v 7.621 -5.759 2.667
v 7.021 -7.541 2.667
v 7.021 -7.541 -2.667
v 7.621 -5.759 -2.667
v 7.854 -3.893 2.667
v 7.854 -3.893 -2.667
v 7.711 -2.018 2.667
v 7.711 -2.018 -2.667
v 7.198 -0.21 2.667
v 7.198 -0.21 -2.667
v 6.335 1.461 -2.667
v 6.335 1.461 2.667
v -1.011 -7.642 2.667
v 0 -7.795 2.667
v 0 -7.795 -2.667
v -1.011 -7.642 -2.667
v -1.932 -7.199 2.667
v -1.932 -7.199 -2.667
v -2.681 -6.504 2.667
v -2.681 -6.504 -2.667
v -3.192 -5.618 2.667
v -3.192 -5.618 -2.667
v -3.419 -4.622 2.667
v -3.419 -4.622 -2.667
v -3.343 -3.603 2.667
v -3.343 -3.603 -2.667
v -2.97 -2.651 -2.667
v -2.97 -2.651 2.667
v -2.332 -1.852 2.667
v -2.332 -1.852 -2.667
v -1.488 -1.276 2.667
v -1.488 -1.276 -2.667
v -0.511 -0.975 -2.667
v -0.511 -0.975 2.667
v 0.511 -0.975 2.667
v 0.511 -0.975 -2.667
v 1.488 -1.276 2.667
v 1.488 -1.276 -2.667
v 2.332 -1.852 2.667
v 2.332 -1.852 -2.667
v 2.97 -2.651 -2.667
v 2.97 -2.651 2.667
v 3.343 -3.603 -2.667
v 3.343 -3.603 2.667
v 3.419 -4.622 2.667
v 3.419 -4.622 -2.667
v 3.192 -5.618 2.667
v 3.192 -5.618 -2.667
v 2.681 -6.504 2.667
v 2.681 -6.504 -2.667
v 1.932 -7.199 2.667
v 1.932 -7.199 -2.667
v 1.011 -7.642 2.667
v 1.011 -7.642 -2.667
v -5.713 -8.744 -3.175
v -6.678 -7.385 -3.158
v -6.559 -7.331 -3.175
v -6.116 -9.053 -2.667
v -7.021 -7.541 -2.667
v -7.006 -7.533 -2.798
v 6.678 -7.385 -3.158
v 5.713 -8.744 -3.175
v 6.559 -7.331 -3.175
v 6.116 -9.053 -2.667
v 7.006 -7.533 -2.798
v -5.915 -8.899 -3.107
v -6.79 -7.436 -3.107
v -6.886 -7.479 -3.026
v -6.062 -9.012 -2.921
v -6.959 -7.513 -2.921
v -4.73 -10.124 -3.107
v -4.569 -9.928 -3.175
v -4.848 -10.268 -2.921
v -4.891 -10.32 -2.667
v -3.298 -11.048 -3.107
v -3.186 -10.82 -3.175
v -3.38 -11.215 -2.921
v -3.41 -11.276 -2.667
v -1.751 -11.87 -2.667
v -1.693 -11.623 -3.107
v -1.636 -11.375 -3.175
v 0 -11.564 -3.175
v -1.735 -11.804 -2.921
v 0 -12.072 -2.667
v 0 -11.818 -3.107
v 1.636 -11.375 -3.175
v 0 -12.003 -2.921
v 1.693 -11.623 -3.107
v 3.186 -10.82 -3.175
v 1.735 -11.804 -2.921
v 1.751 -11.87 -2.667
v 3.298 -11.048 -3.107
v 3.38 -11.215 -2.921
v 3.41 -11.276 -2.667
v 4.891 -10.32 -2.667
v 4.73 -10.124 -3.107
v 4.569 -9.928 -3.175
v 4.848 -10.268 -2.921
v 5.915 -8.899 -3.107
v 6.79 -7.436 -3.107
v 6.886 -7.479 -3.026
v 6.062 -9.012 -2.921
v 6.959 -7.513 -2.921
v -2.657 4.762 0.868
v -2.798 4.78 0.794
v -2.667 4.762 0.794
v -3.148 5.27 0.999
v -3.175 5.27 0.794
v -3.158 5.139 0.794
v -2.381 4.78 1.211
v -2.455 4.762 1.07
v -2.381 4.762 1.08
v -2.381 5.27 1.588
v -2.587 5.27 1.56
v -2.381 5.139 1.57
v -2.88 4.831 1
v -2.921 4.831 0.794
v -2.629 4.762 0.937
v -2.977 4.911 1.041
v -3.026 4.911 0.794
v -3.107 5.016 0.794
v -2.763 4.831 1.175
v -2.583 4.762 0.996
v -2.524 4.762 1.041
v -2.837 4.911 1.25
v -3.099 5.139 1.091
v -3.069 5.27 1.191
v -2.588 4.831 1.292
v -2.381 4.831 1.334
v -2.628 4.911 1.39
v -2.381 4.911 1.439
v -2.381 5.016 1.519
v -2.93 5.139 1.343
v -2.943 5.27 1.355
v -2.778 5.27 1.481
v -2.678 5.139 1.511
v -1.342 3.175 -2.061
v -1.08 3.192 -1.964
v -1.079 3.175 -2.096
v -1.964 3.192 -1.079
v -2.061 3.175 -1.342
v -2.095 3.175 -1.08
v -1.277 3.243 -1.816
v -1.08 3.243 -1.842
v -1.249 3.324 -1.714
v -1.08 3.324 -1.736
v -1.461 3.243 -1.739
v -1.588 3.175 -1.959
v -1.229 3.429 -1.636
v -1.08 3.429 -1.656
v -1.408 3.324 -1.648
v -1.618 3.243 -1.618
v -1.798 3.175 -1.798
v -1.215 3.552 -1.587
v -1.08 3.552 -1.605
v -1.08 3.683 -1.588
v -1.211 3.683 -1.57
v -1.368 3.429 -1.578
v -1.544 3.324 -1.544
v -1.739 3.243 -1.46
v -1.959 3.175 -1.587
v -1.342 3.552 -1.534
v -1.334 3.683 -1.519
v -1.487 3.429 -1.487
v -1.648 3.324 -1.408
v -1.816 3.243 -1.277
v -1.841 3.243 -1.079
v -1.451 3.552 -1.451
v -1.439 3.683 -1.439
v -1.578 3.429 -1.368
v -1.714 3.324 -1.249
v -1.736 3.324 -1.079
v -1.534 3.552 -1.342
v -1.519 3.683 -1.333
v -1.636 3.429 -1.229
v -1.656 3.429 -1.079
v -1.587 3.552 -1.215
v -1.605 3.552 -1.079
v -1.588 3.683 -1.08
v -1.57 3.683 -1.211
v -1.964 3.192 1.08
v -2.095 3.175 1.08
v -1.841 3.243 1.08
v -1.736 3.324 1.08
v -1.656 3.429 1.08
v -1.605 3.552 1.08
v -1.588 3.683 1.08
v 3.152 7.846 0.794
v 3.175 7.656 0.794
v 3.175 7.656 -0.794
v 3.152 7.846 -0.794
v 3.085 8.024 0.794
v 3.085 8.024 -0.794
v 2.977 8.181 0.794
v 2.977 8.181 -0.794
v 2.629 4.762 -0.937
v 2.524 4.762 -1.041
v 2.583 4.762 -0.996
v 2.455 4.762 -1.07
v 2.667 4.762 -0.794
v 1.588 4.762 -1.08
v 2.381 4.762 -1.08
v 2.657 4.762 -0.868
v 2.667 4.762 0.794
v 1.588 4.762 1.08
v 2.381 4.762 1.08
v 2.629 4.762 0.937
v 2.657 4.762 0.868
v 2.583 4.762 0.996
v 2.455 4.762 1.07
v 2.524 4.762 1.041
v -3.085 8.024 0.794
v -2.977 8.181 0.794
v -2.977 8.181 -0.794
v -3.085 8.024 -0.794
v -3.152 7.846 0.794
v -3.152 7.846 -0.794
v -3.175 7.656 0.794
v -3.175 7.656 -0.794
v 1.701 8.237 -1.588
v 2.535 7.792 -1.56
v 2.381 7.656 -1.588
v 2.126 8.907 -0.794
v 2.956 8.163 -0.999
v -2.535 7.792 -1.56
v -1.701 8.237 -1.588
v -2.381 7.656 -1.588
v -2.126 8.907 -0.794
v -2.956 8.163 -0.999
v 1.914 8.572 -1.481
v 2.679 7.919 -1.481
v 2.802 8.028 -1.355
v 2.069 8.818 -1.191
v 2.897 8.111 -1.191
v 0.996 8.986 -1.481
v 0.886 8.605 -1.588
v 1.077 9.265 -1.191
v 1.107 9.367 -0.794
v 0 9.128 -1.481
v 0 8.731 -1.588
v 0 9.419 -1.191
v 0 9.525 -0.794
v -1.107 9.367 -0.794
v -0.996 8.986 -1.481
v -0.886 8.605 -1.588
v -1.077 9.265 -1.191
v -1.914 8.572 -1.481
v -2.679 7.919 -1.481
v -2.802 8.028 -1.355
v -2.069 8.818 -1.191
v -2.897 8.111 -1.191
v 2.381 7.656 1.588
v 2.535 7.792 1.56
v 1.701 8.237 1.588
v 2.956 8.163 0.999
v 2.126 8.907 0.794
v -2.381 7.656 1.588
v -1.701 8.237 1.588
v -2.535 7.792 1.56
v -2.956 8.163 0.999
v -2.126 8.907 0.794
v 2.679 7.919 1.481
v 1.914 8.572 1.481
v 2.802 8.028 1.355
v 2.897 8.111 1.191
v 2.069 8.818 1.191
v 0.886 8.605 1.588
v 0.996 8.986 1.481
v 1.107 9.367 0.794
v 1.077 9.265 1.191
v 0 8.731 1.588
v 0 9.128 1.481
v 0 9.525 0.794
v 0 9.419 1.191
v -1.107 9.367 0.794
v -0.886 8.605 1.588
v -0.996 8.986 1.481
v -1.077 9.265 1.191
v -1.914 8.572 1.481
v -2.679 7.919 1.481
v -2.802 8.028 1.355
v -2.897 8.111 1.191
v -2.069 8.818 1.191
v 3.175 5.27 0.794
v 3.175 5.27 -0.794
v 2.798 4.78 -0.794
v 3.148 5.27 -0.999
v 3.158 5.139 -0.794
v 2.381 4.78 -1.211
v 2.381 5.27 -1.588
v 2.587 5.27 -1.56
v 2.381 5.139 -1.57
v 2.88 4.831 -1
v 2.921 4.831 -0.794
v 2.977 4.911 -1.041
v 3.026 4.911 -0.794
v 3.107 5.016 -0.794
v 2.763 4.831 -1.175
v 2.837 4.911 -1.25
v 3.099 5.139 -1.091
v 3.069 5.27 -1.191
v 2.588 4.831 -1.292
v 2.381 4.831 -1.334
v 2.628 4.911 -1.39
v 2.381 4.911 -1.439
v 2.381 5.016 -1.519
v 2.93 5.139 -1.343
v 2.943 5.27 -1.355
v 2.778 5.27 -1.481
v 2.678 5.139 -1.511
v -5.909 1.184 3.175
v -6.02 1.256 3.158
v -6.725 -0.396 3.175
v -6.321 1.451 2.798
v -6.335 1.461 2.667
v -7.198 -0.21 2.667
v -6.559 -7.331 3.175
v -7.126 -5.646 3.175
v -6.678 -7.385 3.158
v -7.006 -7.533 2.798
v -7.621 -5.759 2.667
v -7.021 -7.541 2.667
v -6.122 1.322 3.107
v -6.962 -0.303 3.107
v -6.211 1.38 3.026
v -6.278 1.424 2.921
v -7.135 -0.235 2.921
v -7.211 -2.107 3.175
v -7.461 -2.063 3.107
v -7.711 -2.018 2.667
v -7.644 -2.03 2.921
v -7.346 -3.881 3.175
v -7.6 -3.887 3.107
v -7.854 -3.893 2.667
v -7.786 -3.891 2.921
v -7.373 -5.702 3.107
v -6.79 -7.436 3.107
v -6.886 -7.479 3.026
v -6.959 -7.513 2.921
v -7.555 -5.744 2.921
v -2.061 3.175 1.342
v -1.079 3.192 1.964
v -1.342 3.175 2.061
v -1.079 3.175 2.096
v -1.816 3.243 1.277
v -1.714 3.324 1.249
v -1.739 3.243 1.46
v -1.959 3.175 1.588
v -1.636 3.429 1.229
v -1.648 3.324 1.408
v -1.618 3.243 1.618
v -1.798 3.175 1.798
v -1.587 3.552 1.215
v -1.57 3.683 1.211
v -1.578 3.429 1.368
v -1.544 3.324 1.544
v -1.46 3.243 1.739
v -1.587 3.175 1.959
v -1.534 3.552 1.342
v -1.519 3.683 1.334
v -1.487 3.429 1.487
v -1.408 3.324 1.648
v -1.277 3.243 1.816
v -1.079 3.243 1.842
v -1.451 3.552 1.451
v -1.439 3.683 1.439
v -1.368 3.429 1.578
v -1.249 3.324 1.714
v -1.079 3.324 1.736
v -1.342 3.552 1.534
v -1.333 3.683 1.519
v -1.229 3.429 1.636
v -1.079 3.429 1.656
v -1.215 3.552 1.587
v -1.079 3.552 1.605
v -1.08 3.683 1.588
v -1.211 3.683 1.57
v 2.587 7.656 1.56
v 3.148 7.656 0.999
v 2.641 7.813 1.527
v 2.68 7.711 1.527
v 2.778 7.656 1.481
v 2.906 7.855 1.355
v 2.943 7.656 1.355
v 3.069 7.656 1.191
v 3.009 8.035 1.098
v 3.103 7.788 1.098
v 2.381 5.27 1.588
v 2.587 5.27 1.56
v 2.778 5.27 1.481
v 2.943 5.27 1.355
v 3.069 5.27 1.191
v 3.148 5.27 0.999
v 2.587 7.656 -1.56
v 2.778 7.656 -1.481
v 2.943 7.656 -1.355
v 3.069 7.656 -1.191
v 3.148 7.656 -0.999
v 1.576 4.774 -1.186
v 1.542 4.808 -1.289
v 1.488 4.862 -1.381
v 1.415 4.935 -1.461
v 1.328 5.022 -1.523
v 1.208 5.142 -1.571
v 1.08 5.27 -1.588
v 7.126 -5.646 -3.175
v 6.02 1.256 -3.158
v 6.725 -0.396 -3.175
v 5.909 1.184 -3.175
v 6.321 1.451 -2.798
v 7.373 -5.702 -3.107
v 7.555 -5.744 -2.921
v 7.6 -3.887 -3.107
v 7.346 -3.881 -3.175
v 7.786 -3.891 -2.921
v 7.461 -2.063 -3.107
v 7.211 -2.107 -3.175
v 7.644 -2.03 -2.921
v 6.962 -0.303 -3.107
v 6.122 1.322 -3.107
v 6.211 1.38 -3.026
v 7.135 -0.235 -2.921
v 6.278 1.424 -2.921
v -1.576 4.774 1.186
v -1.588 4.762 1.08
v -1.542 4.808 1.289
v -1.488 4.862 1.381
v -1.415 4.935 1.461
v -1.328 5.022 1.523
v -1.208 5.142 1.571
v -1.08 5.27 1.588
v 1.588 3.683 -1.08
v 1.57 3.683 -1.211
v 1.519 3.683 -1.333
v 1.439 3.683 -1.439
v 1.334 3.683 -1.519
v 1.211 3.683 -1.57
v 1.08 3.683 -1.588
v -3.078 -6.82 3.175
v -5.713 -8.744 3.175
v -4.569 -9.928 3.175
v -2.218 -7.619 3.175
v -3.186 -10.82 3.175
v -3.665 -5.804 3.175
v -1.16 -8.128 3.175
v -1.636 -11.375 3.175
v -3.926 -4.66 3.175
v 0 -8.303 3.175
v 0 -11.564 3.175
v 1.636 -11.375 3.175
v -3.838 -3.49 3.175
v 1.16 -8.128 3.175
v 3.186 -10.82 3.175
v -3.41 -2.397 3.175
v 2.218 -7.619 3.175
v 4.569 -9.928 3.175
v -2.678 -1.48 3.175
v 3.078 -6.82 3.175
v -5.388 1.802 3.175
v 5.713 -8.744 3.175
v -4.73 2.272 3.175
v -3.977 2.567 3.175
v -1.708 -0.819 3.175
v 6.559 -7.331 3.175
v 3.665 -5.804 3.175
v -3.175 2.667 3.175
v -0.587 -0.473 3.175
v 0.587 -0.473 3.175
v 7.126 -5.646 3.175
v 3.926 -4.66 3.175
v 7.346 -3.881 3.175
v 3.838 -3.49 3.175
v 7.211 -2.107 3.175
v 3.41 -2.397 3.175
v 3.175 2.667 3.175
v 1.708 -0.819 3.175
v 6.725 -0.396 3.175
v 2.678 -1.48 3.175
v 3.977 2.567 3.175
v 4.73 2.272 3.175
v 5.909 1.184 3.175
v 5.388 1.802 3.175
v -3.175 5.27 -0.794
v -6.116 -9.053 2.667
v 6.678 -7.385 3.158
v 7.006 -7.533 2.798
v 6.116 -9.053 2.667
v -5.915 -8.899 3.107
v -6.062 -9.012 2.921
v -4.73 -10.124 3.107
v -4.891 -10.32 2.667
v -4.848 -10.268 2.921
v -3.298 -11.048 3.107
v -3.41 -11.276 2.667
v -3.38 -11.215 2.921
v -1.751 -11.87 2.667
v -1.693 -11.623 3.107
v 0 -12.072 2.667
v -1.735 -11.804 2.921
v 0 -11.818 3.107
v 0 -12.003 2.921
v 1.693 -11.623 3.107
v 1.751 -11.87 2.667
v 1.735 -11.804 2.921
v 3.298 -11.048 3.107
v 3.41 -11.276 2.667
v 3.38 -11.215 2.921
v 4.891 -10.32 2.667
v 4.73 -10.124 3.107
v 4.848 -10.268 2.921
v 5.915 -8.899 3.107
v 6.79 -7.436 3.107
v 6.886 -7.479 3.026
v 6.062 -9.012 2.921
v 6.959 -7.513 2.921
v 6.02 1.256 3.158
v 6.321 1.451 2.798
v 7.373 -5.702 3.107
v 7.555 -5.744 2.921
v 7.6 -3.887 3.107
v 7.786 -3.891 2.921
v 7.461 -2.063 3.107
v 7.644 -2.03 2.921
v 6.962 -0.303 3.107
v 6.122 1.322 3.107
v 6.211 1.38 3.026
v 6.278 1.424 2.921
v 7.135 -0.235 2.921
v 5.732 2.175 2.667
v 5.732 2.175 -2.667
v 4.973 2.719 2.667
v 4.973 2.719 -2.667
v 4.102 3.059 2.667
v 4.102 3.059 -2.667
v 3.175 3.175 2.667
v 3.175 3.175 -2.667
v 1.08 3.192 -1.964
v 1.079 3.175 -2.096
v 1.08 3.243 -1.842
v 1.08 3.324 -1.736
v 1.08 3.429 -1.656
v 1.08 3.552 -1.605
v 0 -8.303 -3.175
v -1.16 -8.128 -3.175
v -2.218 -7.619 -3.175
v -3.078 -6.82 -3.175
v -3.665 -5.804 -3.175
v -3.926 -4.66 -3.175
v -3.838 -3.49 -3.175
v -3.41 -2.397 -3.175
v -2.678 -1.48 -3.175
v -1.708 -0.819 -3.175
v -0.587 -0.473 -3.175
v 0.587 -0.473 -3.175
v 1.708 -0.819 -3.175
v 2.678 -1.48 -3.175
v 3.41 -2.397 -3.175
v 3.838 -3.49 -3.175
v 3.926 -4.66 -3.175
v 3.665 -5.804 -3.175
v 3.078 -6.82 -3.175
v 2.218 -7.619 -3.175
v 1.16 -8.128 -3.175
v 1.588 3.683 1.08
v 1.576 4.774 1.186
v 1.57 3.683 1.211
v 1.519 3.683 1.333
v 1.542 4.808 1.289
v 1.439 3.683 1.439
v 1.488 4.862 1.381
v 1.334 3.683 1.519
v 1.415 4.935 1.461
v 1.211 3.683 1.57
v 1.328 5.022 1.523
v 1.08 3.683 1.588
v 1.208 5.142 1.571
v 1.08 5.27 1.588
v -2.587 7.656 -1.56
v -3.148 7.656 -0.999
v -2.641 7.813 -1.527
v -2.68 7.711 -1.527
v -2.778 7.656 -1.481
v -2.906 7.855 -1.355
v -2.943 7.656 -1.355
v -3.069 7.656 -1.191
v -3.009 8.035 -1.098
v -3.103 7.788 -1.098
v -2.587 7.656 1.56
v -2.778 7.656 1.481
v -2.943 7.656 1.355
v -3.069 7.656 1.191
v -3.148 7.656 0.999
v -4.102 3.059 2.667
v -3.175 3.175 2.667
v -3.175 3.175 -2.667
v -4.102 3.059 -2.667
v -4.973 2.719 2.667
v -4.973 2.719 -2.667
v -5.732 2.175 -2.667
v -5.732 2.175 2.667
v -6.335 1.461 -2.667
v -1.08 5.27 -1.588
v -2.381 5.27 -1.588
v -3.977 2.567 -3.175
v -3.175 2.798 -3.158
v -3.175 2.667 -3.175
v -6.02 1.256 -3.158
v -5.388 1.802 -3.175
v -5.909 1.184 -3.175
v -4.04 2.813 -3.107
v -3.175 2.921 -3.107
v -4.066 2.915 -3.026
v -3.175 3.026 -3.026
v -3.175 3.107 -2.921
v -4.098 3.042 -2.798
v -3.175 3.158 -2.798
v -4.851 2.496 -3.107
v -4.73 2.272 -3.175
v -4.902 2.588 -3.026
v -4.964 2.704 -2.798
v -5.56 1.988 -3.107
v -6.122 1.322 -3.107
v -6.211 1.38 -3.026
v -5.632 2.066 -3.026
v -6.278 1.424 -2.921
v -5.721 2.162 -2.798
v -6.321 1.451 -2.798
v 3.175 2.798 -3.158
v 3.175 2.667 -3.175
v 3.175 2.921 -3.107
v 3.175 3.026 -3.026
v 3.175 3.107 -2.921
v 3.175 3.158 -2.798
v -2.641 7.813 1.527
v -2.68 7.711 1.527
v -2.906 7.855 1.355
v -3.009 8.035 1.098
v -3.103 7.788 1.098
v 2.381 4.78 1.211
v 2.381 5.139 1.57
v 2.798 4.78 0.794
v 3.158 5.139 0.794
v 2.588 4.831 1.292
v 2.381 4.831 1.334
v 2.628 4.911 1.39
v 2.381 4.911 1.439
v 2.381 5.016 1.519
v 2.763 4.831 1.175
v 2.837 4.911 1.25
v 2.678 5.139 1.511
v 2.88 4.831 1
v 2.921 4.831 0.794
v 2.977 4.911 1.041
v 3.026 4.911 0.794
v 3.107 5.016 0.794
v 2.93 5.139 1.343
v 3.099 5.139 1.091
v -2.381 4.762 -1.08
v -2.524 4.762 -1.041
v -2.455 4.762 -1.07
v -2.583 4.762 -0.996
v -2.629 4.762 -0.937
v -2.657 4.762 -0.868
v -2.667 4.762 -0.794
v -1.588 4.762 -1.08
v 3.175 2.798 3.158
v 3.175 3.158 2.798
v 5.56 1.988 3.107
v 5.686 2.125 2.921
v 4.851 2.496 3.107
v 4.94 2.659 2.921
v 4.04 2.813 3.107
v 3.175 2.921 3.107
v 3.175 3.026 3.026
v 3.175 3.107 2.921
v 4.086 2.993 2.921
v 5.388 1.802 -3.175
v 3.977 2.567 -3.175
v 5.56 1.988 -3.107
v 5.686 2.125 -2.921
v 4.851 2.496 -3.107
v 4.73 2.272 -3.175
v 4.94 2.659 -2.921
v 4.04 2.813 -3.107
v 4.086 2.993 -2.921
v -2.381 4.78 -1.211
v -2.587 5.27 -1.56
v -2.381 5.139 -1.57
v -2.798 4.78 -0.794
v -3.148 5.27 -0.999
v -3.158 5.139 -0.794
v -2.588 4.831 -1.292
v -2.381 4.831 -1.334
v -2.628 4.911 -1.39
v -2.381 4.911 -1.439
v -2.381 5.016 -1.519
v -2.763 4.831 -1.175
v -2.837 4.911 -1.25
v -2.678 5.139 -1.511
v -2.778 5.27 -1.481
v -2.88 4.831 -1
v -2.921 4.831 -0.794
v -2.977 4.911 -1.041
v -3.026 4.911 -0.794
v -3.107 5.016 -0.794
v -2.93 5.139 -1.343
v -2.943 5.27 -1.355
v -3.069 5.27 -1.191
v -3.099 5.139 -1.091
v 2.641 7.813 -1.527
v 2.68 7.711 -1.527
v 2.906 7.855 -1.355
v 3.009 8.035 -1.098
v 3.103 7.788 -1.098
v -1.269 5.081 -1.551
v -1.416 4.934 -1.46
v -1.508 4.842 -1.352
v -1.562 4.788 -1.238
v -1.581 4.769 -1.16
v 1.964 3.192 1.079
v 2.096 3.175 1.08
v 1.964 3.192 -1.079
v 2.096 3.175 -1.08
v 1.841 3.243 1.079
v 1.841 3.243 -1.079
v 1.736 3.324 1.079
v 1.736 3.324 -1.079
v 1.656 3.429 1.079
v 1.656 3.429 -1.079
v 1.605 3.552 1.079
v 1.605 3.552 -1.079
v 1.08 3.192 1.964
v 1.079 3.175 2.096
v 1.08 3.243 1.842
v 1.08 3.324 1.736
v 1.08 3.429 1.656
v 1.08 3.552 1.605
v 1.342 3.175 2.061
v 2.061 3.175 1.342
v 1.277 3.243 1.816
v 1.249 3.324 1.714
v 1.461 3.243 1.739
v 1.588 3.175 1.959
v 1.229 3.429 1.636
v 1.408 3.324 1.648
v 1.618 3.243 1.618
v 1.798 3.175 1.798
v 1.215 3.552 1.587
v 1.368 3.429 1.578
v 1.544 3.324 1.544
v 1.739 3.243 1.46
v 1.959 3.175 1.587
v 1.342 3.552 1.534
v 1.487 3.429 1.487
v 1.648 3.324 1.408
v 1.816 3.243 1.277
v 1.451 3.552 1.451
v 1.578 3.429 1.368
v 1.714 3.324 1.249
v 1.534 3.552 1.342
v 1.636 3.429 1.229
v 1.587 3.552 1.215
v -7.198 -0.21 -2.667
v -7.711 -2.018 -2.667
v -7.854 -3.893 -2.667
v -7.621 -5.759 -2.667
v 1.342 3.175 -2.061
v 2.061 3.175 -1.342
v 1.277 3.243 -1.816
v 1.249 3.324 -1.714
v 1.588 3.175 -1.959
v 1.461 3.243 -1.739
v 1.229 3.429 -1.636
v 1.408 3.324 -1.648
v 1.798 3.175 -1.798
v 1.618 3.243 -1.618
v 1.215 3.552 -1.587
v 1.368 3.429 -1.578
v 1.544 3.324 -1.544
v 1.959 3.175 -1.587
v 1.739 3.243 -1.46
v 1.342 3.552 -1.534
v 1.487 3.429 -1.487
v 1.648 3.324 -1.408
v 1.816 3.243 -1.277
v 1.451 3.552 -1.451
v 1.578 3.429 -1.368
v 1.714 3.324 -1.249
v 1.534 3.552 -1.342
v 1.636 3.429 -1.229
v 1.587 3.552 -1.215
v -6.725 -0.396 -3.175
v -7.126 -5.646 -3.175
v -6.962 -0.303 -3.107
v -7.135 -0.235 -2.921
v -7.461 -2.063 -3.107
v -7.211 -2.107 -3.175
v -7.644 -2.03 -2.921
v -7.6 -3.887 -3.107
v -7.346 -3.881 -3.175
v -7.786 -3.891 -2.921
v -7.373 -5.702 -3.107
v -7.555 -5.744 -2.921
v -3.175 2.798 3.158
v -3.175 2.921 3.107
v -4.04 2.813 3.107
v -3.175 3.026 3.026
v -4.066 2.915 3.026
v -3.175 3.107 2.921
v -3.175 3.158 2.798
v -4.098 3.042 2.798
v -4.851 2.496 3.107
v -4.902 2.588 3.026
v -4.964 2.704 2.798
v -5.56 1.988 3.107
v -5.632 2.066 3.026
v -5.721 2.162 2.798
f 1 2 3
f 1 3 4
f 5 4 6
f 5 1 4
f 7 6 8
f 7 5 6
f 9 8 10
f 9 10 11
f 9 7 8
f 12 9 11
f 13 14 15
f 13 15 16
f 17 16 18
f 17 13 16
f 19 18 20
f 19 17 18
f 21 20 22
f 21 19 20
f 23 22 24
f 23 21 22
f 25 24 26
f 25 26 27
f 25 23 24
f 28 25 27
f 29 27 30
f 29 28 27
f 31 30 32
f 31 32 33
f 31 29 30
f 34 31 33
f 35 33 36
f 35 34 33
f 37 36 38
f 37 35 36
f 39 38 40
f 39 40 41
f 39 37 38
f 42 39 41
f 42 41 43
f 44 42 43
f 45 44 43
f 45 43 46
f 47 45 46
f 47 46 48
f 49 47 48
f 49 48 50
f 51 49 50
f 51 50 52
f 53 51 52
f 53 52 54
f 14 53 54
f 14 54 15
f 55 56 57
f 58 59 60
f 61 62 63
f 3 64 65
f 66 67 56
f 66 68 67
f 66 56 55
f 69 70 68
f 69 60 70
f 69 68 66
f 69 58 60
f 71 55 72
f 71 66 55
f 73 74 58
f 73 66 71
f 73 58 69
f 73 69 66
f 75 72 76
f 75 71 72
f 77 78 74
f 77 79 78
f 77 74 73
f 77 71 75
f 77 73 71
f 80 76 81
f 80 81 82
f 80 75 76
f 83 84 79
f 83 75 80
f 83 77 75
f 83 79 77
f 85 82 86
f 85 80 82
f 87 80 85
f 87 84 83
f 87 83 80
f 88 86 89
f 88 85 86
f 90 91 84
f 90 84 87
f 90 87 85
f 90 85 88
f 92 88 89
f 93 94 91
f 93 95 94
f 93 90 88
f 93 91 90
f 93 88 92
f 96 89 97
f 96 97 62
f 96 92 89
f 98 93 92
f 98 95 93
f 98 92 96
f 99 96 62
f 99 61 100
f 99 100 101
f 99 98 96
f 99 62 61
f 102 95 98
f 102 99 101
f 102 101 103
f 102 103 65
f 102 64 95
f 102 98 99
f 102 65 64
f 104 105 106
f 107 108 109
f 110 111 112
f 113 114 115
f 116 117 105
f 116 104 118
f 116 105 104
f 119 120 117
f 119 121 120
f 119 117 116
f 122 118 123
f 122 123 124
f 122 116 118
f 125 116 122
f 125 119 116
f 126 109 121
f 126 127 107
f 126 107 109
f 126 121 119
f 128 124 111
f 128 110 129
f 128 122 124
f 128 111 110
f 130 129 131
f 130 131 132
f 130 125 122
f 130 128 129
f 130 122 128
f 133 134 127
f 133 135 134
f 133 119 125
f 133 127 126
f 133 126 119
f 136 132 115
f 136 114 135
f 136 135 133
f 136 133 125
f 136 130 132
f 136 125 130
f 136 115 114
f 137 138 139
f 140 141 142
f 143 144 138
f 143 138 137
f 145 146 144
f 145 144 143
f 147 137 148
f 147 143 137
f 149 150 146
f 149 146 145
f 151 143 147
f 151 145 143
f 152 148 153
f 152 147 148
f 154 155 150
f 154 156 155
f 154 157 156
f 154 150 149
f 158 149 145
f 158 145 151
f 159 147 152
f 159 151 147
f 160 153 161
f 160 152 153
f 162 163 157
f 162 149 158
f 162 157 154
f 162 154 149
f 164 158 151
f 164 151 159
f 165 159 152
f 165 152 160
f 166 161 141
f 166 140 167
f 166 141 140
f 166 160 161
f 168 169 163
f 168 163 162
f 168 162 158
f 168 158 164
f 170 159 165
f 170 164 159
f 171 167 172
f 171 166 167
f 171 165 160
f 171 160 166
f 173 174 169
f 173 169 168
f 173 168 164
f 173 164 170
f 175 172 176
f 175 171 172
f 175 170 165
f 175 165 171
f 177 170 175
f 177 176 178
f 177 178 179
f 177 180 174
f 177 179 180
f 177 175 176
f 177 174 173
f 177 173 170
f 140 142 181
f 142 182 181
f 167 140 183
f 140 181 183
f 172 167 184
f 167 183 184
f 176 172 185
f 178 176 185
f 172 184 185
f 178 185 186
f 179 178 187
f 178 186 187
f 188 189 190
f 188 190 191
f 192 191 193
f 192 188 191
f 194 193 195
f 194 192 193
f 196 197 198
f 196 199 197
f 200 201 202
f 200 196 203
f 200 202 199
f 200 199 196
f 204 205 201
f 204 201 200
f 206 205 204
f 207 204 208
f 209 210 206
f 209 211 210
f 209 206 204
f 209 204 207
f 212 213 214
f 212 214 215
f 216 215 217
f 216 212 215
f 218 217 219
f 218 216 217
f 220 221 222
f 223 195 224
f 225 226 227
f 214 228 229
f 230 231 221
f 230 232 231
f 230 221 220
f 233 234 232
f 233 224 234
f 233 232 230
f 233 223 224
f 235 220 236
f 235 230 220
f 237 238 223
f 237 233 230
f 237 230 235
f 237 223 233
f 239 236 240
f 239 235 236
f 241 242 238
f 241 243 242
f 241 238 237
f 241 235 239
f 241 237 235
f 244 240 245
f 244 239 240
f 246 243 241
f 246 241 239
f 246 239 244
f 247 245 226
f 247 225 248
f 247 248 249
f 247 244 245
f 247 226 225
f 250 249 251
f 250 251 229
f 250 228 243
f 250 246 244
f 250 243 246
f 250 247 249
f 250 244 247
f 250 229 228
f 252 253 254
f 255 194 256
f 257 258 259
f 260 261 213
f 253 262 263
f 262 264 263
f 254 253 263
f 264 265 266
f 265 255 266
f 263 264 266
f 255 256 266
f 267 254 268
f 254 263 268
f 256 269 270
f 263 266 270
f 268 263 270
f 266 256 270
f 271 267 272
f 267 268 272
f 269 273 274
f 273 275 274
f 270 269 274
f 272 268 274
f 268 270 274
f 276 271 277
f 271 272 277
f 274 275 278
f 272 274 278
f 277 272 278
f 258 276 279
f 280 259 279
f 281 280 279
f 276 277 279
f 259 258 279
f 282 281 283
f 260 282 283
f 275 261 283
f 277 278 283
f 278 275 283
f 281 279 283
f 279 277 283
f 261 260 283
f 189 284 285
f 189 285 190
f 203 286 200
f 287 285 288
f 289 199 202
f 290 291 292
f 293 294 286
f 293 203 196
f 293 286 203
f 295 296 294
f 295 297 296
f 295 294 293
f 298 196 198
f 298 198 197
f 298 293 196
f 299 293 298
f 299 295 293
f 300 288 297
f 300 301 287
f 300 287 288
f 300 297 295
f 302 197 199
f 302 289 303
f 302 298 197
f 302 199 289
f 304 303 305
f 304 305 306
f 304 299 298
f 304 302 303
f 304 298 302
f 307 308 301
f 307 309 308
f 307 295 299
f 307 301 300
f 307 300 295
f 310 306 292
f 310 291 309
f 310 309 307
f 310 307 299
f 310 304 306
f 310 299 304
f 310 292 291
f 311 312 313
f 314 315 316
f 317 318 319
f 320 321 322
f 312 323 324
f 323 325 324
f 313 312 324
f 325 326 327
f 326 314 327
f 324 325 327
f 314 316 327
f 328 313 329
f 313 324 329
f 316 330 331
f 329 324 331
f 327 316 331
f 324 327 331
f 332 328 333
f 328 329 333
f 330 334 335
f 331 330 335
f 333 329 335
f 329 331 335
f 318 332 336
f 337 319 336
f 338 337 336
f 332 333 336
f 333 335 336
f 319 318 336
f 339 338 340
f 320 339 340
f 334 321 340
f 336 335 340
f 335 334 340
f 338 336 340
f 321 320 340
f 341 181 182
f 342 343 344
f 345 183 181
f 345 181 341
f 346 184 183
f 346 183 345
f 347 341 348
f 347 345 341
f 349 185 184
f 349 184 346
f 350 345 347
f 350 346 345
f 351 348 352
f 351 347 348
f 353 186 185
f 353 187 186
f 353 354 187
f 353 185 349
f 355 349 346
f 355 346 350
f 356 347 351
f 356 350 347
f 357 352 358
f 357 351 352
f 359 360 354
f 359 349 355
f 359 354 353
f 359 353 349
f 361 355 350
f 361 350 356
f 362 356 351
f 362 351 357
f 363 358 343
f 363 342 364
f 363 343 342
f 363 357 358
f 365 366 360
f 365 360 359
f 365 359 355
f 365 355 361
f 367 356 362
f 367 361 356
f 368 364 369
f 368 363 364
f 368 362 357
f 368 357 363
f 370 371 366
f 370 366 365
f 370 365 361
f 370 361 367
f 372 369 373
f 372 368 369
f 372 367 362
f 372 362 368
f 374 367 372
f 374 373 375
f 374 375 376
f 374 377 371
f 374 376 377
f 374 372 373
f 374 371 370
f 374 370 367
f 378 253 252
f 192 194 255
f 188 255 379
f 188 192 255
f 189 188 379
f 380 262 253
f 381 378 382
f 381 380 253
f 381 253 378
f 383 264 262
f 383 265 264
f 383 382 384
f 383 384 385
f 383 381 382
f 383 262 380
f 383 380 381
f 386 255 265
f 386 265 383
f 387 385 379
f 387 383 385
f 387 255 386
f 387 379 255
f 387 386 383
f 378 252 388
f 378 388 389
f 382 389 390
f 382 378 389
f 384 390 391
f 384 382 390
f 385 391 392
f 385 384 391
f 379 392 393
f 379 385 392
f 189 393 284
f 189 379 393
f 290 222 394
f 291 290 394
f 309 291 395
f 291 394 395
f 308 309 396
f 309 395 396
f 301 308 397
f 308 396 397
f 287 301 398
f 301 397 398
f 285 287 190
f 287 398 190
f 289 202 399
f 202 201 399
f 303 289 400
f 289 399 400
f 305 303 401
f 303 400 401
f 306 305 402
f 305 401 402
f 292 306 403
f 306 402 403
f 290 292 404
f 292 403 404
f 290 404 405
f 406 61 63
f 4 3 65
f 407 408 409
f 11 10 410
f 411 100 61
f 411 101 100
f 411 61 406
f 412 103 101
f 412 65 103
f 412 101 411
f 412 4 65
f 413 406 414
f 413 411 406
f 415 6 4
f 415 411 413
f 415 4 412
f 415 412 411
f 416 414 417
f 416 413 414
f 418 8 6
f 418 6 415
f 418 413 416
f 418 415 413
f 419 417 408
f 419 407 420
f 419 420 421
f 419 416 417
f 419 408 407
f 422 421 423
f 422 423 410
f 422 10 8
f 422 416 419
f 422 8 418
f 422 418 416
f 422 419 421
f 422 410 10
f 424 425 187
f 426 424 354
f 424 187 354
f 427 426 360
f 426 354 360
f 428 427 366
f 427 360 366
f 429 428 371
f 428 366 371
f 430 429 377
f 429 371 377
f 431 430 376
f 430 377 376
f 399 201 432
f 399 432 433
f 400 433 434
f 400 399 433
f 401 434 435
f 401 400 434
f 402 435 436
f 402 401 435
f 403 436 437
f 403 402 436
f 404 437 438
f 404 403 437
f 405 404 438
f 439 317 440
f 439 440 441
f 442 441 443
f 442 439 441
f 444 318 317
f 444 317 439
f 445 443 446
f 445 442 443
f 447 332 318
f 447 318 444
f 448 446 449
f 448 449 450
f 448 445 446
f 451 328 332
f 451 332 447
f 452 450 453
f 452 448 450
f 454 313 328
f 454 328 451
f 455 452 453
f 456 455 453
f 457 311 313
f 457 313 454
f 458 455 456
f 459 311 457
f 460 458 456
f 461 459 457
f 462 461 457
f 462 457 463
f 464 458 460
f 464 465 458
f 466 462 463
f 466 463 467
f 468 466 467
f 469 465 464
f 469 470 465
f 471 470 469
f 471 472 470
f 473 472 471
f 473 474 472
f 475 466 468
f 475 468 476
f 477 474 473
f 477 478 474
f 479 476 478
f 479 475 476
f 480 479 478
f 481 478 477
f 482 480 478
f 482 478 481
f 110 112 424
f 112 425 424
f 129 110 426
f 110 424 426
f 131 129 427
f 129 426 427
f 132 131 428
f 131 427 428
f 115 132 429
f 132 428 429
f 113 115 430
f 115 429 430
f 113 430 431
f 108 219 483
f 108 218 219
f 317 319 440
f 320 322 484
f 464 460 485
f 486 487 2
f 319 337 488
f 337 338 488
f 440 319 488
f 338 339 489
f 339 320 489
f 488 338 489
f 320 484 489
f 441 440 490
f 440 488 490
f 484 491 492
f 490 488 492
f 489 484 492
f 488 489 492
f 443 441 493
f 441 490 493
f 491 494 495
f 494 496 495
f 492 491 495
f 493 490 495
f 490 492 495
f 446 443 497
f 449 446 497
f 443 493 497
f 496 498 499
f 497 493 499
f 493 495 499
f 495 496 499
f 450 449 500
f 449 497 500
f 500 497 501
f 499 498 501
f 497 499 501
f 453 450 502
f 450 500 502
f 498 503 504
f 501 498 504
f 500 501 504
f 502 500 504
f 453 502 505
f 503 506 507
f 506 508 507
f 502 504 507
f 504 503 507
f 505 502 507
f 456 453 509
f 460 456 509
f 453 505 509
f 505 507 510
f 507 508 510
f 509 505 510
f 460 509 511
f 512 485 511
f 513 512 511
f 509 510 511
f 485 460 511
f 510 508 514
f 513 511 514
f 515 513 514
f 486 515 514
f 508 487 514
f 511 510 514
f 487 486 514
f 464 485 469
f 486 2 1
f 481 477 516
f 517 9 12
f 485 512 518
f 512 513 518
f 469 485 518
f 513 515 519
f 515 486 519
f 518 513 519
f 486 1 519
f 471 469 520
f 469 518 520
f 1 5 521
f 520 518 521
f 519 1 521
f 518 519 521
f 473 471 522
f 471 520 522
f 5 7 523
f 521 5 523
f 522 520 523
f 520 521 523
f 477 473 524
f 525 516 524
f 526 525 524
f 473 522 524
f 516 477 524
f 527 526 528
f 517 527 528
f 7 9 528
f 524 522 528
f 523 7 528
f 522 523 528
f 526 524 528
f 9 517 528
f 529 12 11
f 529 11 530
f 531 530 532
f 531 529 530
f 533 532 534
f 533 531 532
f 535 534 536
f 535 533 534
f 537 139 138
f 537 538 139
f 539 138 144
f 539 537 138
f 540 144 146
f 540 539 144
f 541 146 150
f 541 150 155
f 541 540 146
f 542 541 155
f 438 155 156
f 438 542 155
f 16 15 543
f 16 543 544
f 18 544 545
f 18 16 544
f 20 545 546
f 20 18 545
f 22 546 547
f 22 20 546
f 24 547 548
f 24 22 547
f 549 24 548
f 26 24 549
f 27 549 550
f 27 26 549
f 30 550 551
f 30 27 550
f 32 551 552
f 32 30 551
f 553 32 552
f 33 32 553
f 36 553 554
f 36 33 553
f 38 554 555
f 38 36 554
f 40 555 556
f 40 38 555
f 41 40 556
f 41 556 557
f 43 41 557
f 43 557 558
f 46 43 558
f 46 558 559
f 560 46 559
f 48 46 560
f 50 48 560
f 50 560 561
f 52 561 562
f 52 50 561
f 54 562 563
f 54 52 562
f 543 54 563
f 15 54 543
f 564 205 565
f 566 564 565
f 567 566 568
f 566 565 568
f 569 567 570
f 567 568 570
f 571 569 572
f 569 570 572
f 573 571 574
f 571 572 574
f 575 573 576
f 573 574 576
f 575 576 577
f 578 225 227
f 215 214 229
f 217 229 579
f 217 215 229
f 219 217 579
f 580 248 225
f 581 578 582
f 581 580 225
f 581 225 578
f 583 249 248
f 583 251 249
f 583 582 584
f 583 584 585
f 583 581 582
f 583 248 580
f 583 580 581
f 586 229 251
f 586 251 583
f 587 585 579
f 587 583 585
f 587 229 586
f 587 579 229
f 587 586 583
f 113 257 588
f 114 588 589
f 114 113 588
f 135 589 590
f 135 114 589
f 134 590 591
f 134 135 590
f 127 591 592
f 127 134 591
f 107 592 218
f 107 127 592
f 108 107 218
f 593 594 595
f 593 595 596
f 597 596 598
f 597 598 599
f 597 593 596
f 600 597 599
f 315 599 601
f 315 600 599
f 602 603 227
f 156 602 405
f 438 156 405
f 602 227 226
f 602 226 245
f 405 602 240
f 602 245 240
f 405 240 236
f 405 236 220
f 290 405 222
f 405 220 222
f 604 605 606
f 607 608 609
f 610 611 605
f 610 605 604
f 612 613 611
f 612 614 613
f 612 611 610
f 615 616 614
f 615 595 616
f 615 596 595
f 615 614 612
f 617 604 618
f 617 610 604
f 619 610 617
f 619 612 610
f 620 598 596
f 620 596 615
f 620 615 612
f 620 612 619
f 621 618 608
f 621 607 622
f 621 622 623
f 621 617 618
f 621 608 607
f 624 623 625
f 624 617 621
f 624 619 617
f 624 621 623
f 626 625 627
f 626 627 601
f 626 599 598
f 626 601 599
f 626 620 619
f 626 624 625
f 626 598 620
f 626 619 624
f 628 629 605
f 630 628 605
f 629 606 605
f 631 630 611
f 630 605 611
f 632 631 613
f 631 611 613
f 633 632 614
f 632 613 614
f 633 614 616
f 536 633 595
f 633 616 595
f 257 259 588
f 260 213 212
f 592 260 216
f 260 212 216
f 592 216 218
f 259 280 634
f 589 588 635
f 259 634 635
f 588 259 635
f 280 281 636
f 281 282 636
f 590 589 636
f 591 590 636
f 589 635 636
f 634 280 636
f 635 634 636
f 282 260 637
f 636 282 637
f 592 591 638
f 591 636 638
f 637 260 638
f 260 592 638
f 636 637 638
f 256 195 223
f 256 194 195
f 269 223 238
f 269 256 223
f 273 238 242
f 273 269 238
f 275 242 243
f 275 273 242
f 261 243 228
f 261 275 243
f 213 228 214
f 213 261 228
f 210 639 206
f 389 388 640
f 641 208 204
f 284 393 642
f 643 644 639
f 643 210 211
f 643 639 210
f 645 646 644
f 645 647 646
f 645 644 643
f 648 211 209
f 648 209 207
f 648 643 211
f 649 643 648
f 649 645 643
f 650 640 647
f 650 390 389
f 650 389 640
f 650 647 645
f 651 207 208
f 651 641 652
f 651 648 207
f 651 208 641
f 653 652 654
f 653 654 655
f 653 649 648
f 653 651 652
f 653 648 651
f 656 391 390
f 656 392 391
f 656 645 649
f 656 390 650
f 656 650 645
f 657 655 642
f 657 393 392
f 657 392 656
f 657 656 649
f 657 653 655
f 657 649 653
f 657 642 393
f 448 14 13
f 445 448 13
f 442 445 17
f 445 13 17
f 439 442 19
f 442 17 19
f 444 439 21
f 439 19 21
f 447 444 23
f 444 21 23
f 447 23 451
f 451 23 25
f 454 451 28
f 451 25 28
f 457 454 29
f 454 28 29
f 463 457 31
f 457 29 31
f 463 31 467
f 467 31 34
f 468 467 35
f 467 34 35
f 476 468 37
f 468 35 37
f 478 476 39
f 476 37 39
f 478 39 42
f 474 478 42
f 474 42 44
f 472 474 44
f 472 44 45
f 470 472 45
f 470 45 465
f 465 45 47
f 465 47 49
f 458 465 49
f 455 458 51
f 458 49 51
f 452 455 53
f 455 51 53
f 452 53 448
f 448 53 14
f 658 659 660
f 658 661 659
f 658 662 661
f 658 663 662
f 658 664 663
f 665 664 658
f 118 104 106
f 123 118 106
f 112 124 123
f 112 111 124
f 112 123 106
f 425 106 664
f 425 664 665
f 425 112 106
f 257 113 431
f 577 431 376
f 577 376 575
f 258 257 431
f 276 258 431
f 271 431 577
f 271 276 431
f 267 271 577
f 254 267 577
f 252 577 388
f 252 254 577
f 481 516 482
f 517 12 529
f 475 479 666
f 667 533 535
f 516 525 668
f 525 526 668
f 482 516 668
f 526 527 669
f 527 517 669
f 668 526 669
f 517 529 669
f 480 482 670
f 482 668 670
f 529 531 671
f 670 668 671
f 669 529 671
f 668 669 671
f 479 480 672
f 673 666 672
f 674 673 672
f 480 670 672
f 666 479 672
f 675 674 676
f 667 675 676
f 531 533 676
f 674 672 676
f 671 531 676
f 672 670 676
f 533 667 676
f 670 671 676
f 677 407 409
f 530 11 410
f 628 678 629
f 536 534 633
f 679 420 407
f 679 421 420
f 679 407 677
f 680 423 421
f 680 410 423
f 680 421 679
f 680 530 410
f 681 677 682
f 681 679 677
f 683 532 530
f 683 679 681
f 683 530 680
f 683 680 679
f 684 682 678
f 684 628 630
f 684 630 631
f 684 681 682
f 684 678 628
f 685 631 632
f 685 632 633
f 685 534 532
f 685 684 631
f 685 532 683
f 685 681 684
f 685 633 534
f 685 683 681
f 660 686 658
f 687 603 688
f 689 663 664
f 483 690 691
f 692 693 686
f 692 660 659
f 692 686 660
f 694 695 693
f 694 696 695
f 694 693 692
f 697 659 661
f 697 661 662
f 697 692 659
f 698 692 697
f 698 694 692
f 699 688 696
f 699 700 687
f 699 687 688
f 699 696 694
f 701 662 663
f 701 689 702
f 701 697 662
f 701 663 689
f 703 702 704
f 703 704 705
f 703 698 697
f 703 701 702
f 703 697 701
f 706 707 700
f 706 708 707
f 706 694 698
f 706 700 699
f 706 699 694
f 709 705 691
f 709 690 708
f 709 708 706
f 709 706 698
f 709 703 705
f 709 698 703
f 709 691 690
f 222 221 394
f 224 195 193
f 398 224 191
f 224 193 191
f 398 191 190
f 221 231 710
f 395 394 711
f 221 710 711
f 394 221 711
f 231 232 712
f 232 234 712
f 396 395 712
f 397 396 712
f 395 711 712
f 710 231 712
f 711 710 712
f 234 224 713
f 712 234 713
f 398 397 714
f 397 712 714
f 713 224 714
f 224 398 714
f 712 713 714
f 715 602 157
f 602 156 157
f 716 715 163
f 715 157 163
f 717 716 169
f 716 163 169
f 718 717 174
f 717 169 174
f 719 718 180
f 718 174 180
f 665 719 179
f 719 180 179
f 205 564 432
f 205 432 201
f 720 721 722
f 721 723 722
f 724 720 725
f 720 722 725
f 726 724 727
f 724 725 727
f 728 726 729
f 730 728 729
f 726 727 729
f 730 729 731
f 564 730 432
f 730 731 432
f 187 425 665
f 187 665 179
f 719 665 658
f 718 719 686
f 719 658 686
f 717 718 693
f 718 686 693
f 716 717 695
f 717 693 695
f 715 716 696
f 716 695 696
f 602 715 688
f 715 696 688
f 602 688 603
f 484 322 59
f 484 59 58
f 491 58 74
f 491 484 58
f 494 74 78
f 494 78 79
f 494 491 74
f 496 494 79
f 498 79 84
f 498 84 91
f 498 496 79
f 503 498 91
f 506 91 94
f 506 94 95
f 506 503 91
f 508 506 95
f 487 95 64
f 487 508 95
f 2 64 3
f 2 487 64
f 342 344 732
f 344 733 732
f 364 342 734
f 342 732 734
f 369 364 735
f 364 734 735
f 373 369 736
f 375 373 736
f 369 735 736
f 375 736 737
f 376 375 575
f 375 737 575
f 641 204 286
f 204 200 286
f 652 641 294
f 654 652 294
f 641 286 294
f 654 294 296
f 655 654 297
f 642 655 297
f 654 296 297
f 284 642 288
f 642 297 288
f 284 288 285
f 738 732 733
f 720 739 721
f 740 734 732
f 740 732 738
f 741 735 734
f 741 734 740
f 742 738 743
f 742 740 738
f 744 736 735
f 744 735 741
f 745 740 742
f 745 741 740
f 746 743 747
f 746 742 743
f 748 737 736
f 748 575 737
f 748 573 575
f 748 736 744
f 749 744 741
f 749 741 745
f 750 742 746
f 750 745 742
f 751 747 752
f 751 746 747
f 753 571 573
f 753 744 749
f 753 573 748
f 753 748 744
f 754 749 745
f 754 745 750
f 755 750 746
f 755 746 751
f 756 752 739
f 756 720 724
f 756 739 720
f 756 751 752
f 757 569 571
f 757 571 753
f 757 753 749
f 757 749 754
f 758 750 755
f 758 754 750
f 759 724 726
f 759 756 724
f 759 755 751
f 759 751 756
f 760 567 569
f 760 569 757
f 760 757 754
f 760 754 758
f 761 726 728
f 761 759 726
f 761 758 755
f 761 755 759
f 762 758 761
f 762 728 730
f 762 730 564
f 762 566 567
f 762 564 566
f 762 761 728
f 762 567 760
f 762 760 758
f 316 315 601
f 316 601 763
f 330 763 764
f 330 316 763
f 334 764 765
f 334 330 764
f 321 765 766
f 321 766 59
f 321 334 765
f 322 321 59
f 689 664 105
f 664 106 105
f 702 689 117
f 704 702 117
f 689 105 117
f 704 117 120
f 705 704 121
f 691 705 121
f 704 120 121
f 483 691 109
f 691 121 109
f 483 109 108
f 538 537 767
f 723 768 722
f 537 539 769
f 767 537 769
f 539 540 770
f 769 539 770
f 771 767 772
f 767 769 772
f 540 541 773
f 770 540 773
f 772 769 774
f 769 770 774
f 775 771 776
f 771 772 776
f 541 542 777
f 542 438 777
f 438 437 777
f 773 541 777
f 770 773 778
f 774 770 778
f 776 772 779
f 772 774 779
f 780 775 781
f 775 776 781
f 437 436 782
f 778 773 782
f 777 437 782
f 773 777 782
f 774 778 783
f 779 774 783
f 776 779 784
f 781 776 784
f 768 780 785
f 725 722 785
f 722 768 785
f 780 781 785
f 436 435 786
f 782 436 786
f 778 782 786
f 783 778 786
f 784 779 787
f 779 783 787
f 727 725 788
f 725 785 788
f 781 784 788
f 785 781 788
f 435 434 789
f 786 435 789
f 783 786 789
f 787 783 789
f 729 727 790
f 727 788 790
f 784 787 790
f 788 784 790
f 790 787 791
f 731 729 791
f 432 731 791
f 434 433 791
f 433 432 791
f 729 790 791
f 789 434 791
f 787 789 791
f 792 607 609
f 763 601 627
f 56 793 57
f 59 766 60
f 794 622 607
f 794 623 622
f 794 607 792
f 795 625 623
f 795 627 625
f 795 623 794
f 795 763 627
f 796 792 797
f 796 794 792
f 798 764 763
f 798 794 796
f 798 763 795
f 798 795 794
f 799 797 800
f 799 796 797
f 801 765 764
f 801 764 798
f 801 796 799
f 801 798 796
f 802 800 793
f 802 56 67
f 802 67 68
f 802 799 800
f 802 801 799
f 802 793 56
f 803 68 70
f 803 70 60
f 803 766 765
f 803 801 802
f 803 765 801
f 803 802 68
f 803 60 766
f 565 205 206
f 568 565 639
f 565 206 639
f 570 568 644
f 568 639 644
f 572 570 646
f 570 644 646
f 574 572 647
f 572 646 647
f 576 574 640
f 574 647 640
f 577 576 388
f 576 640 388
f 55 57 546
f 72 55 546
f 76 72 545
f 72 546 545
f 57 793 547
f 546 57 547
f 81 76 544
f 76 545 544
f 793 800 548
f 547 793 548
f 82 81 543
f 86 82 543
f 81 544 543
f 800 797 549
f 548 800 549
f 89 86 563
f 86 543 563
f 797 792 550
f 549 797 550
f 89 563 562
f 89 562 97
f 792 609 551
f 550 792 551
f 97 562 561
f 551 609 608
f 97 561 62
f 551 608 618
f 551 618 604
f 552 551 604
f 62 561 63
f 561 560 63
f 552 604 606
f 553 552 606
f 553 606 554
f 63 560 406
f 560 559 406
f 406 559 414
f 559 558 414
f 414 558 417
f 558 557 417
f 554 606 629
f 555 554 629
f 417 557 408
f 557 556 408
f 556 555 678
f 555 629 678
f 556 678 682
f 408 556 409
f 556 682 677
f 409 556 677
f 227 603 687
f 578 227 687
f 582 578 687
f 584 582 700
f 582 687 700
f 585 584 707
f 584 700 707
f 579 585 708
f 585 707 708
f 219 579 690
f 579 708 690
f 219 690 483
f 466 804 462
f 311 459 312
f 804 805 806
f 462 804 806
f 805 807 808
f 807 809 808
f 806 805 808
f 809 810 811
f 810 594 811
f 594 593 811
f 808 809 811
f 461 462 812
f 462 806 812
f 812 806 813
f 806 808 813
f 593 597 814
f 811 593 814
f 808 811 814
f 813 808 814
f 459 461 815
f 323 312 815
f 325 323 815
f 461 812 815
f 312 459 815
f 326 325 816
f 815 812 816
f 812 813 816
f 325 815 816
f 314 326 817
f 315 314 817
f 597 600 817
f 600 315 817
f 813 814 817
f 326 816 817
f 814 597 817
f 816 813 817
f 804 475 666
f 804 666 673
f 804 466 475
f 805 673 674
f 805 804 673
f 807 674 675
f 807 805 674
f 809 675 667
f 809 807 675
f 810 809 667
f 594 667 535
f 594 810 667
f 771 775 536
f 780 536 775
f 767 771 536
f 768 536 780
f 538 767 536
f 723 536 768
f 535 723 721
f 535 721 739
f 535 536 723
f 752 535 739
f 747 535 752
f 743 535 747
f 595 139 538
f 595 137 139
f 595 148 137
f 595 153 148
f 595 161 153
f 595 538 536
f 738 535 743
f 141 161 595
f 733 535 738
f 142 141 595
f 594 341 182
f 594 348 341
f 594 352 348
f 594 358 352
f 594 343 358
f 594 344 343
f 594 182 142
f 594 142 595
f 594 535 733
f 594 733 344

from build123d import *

# Parameters (mm, degrees)
F1_DEPTH = 1.5875
F2_DEPTH = 3.175
F3_R     = 3.17499
F4_R     = 0.79375
F6_DEPTH = 3.175
F7_R     = 0.508
F8_R     = 0.508
F9_SIZE  = 0.508


# Not quite as in the source:
# - a fillet or chamfer is up to 0.001 mm smaller than in the source, because OpenCascade refuses the exact size
# - a feature names something its author has since deleted; it is built from what else it names


with BuildPart() as f1:
    # F0 (on Top) → F1 (new body, symmetric)
    with BuildSketch(Plane.XY):
        with BuildLine():
            Line((3.175, 4.7625), (3.175, 7.9375))
            ThreePointArc((3.175, 7.9375), (0, 9.525), (-3.175, 7.9375))
            Line((-3.175, 7.9375), (-3.175, 4.7625))
            Line((-3.175, 4.7625), (-1.5875, 4.7625))
            Line((-1.5875, 4.7625), (-1.5875, 3.175))
            Line((-1.5875, 3.175), (1.5875, 3.175))
            Line((1.5875, 3.175), (1.5875, 4.7625))
            Line((1.5875, 4.7625), (3.175, 4.7625))
        make_face()
    extrude(amount=F1_DEPTH, both=True)

    # F0 (on Top) → F2 (join, symmetric)
    with BuildSketch(Plane.XY):
        Polygon((6.35, 3.175), (1.5875, 3.175), (-1.5875, 3.175), (-6.35, 3.175), (-6.35, 0), (6.35, 0), align=None)
    extrude(amount=F2_DEPTH, both=True)

    # F3 (radius 3.175 in the source; OpenCascade refuses exactly that, so slightly less here)
    f3_edges = [f1.edges().sort_by_distance(p)[0] for p in [
        (6.35, 3.175, 0),
        (-6.35, 3.175, 0),
    ]]
    fillet(f3_edges, radius=F3_R)

    # F4
    f4_edges = [f1.edges().sort_by_distance(p)[0] for p in [
        (0, 9.525, -1.5875),
        (0, 9.525, 1.5875),
        (3.175, 6.35, -1.5875),
        (3.175, 6.35, 1.5875),
        (-3.175, 6.35, -1.5875),
        (-3.175, 6.35, 1.5875),
        (3.175, 7.9375, 0),
        (-3.175, 7.9375, 0),
    ]]
    fillet(f4_edges, radius=F4_R)

    # F5 (on Top) → F6 (join, symmetric)
    with BuildSketch(Plane.XY):
        with BuildLine():
            Line((1.5875, 3.175), (-1.5875, 3.175))
            ThreePointArc((-1.5875, 3.175), (-6.8727430801, -0.8804299989), (-7.0214355114, -7.540625))
            ThreePointArc((-7.0214355114, -7.540625), (0, -12.0715436111), (7.0214355114, -7.540625))
            ThreePointArc((7.0214355114, -7.540625), (6.8727430801, -0.8804299989), (1.5875, 3.175))
        make_face()
        with BuildLine():
            ThreePointArc((0, -0.936625), (3.429, -4.365625), (0, -7.794625))
            ThreePointArc((0, -7.794625), (-3.429, -4.365625), (0, -0.936625))
        make_face(mode=Mode.SUBTRACT)
        with BuildLine():
            Line((3.175, 3.175), (1.5875, 3.175))
            ThreePointArc((1.5875, 3.175), (6.8727430801, -0.8804299989), (7.0214355114, -7.540625))
            ThreePointArc((7.0214355114, -7.540625), (7.829384353, -2.9521060097), (6.3352448193, 1.4609241182))
            ThreePointArc((6.3352448193, 1.4609241182), (4.9725819485, 2.7188926062), (3.175, 3.175))
        make_face()
        with BuildLine():
            Line((-1.5875, 3.175), (-3.175, 3.175))
            ThreePointArc((-3.175, 3.175), (-4.9725819485, 2.7188926062), (-6.3352448193, 1.4609241182))
            ThreePointArc((-6.3352448193, 1.4609241182), (-7.829384353, -2.9521060097), (-7.0214355114, -7.540625))
            ThreePointArc((-7.0214355114, -7.540625), (-6.8727430801, -0.8804299989), (-1.5875, 3.175))
        make_face()
    extrude(amount=F6_DEPTH, both=True)

    # F7
    f7_edges = [f1.edges().sort_by_distance(p)[0] for p in [
        (0, 3.175, -1.5875),
        (-1.5875, 3.175, 0),
        (0, 3.175, 1.5875),
        (1.5875, 3.175, 0),
        (1.5875, 3.96875, 1.5875),
        (1.5875, 3.96875, -1.5875),
        (-1.5875, 3.96875, -1.5875),
        (-1.5875, 3.96875, 1.5875),
        (2.942516, 4.7625, 1.355016),
        (-2.942516, 4.7625, -1.355016),
    ]]
    fillet(f7_edges, radius=F7_R)

    # F8
    f8_edges = [f1.edges().sort_by_distance(p)[0] for p in [
        (-7.829384, -2.952106, -3.175),
        (-7.829384, -2.952106, 3.175),
        (0, 3.175, -3.175),
        (0, 3.175, 3.175),
        (-4.972586, 2.71889, -3.175),
        (0, -12.071544, -3.175),
        (7.829384, -2.952106, -3.175),
        (4.972586, 2.71889, -3.175),
        (4.972586, 2.71889, 3.175),
        (-4.972586, 2.71889, 3.175),
        (0, -12.071544, 3.175),
        (7.829384, -2.952106, 3.175),
    ]]
    fillet(f8_edges, radius=F8_R)

    # F9
    f9_edges = [f1.edges().sort_by_distance(p)[0] for p in [
        (0, -0.936625, 3.175),
        (0, -0.936625, -3.175),
    ]]
    chamfer(f9_edges, length=F9_SIZE)


solid = f1.part
